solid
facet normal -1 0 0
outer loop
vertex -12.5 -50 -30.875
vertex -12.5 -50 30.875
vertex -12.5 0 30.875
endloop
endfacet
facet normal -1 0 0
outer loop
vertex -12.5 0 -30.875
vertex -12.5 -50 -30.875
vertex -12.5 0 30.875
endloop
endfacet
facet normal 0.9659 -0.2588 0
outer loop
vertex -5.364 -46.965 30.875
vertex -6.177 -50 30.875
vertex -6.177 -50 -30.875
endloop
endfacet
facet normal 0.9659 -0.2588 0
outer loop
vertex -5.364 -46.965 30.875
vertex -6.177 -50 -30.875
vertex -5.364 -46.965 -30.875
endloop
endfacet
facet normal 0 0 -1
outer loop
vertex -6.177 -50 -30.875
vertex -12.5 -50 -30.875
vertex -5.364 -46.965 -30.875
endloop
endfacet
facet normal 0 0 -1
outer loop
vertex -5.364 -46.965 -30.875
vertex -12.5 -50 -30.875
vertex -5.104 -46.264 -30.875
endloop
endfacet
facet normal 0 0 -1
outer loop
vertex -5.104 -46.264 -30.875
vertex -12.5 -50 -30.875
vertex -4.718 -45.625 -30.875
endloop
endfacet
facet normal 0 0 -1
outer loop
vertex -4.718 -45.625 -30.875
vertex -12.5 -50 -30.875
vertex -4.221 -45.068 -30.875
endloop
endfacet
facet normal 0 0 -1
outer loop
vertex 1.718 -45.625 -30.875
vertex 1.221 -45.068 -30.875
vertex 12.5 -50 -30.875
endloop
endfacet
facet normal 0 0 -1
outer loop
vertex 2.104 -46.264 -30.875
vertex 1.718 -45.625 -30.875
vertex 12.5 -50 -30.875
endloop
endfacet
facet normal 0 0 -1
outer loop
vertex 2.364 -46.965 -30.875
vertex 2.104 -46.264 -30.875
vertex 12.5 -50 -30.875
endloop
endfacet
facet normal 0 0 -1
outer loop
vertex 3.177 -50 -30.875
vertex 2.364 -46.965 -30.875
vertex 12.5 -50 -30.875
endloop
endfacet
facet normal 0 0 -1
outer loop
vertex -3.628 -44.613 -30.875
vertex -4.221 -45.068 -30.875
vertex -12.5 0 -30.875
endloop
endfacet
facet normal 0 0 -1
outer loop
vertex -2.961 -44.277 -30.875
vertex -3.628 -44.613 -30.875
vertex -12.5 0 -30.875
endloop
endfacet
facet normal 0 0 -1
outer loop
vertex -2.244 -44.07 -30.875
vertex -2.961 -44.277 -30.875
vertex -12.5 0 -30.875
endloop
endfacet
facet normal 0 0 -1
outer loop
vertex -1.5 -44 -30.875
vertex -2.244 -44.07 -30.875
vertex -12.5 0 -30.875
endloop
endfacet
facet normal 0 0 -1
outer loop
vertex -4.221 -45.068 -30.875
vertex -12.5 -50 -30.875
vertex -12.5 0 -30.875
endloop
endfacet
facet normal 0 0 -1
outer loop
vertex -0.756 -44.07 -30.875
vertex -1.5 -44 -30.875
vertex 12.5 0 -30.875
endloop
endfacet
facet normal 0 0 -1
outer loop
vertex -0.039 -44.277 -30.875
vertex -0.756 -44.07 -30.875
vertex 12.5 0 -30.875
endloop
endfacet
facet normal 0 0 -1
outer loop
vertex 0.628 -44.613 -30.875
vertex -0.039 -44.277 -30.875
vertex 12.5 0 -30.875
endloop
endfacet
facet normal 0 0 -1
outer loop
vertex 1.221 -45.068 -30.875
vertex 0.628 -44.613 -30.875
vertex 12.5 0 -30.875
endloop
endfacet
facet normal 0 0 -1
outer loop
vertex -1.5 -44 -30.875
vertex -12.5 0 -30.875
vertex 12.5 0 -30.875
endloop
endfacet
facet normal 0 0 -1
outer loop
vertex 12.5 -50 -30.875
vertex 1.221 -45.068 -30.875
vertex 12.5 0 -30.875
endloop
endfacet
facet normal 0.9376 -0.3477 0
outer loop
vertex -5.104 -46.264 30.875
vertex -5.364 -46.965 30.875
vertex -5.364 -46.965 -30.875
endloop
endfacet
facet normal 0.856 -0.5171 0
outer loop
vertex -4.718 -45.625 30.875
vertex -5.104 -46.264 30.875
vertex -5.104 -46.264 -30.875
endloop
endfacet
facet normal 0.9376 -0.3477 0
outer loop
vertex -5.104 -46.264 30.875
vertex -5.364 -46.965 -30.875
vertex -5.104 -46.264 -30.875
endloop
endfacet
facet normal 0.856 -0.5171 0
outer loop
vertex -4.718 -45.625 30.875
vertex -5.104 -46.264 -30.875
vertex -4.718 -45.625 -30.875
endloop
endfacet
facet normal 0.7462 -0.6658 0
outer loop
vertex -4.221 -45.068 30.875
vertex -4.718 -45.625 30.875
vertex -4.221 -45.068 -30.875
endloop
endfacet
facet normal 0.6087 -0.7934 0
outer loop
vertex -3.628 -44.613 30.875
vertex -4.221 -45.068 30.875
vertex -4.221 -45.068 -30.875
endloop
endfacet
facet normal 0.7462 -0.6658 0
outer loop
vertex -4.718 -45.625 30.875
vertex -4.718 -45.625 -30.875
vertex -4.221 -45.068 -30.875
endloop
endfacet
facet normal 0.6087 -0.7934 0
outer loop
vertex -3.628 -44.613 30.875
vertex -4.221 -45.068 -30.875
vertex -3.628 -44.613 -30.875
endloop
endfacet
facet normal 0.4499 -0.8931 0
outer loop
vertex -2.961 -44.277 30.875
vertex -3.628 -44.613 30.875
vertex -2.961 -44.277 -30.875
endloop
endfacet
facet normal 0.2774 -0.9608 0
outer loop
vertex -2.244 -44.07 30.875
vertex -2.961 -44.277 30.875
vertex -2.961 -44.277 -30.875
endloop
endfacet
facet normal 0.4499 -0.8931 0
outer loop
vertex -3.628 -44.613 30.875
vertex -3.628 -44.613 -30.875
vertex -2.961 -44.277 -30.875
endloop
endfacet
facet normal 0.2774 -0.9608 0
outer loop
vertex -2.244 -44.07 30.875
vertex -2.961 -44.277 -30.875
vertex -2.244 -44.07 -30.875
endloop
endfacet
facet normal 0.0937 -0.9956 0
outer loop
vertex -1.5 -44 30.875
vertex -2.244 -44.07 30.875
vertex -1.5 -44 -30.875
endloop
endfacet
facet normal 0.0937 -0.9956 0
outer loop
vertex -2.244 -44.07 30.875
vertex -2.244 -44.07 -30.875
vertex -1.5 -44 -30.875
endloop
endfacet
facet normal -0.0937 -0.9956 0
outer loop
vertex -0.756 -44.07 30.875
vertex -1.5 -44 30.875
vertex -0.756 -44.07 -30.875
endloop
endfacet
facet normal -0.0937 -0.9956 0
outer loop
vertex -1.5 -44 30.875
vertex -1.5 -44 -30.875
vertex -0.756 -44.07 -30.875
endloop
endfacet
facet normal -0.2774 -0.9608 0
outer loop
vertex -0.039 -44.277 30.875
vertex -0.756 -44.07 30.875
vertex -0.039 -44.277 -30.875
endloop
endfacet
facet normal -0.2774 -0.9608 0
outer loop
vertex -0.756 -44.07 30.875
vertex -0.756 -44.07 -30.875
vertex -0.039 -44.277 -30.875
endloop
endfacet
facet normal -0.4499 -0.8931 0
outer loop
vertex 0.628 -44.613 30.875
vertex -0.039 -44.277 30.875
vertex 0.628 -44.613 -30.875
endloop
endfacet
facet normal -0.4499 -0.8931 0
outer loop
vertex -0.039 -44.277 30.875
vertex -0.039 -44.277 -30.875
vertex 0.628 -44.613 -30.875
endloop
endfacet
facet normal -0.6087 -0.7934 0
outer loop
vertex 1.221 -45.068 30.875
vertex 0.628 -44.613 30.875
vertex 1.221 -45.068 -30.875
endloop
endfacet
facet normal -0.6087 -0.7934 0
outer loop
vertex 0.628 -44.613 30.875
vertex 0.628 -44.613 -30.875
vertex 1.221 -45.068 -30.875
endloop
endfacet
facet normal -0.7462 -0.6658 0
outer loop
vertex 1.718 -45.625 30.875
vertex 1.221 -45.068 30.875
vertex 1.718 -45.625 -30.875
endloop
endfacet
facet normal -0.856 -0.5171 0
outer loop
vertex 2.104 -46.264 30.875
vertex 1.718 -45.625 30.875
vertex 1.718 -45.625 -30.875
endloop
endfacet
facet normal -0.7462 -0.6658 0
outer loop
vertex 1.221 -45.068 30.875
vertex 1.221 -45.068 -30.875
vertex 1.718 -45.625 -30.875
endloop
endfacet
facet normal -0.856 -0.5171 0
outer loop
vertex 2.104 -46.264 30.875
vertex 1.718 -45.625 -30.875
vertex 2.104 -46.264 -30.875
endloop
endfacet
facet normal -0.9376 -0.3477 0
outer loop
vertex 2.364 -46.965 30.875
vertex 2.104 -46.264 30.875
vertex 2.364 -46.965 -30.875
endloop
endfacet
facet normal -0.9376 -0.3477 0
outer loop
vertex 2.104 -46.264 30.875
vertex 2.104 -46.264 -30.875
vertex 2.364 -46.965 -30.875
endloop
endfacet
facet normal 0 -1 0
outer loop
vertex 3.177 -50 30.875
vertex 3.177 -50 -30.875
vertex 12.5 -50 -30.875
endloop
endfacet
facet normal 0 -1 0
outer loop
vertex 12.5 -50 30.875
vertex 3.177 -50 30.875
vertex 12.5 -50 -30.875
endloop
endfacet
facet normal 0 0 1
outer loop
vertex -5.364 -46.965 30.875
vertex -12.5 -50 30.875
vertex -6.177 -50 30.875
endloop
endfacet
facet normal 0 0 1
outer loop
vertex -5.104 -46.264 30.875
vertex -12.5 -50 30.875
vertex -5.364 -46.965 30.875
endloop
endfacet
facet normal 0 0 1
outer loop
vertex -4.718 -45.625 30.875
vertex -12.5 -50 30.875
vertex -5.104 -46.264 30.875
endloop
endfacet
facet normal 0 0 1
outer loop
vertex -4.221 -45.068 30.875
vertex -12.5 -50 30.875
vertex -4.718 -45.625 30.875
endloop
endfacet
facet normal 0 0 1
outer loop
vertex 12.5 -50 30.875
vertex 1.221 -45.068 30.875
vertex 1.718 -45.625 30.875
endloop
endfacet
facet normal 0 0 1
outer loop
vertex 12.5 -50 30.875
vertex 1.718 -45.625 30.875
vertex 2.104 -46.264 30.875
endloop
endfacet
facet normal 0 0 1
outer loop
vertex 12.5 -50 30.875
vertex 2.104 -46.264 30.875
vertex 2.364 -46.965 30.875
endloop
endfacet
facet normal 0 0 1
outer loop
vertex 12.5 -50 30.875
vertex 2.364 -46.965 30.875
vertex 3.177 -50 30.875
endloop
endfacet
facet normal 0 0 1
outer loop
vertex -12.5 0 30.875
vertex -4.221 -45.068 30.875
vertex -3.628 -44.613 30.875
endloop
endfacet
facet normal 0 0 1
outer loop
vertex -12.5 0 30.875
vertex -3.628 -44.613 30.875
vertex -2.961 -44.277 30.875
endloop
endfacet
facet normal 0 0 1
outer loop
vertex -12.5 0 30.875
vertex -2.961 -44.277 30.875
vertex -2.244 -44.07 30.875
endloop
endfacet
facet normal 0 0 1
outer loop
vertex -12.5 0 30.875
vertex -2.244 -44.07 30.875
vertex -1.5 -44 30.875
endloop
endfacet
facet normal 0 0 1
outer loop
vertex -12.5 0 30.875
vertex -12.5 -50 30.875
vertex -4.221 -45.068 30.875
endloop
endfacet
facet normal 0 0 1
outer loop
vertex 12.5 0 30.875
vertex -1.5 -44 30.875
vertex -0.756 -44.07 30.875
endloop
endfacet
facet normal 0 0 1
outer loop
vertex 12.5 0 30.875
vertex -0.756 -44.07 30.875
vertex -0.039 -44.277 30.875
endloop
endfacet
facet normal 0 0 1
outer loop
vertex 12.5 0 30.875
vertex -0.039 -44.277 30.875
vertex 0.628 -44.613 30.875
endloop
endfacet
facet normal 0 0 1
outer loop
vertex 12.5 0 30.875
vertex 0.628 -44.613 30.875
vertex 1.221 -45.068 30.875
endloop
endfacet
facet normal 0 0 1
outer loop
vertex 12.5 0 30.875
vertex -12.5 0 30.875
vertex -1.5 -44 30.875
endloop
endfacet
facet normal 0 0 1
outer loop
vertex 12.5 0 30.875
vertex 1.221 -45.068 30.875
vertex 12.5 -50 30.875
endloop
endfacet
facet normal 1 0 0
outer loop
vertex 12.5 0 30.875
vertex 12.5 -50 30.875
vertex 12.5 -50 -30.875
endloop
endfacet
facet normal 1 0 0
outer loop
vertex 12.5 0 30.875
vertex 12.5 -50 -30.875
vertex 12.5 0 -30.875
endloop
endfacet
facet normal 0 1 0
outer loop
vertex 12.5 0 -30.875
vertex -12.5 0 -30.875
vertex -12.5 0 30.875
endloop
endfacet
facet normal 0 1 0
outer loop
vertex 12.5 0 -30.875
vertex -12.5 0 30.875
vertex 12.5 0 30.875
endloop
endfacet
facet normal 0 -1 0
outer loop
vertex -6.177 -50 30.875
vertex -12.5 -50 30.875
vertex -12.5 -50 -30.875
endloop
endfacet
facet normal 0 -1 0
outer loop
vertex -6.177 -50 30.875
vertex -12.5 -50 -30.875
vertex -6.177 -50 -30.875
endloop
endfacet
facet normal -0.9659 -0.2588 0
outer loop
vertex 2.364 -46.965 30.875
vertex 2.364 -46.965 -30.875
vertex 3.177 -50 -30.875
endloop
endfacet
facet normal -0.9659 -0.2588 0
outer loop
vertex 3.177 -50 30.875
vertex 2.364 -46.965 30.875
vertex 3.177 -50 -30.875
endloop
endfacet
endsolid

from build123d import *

# Parameters (mm, degrees)
SKETCH1_W           = 25
SKETCH1_H           = 50
BOSS_EXTRUDE1_DEPTH = 30.875
CUT_EXTRUDE1_REACH  = 82.432


with BuildPart() as part:
    # Sketch1 → Boss-Extrude1 (new, symmetric)
    with BuildSketch(Plane.XY):
        with Locations((0, -25)):
            Rectangle(SKETCH1_W, SKETCH1_H)
    extrude(amount=BOSS_EXTRUDE1_DEPTH, both=True)

    # Sketch2 → Cut-Extrude1 (cut, up to next)
    with BuildSketch(Plane(origin=(0, 0, -30.875), x_dir=(-1, 0, 0), z_dir=(0, 0, -1)), mode=Mode.PRIVATE) as cut_extrude1_sk1:
        with BuildLine():
            Line((-2.363703305, -46.96472382), (-3.177003107, -50))
            Line((-3.177003107, -50), (6.177003107, -50))
            Line((6.177003107, -50), (5.363703305, -46.96472382))
            ThreePointArc((5.363703305, -46.96472382), (1.5, -44), (-2.363703305, -46.96472382))
        make_face()
    cut_extrude1_tool1 = extrude(cut_extrude1_sk1.sketch, amount=-CUT_EXTRUDE1_REACH, mode=Mode.PRIVATE) & part.part
    add(cut_extrude1_tool1.solids().sort_by_distance((-1.5, -47.423831, -30.875))[0], mode=Mode.SUBTRACT)


solid = part.part
